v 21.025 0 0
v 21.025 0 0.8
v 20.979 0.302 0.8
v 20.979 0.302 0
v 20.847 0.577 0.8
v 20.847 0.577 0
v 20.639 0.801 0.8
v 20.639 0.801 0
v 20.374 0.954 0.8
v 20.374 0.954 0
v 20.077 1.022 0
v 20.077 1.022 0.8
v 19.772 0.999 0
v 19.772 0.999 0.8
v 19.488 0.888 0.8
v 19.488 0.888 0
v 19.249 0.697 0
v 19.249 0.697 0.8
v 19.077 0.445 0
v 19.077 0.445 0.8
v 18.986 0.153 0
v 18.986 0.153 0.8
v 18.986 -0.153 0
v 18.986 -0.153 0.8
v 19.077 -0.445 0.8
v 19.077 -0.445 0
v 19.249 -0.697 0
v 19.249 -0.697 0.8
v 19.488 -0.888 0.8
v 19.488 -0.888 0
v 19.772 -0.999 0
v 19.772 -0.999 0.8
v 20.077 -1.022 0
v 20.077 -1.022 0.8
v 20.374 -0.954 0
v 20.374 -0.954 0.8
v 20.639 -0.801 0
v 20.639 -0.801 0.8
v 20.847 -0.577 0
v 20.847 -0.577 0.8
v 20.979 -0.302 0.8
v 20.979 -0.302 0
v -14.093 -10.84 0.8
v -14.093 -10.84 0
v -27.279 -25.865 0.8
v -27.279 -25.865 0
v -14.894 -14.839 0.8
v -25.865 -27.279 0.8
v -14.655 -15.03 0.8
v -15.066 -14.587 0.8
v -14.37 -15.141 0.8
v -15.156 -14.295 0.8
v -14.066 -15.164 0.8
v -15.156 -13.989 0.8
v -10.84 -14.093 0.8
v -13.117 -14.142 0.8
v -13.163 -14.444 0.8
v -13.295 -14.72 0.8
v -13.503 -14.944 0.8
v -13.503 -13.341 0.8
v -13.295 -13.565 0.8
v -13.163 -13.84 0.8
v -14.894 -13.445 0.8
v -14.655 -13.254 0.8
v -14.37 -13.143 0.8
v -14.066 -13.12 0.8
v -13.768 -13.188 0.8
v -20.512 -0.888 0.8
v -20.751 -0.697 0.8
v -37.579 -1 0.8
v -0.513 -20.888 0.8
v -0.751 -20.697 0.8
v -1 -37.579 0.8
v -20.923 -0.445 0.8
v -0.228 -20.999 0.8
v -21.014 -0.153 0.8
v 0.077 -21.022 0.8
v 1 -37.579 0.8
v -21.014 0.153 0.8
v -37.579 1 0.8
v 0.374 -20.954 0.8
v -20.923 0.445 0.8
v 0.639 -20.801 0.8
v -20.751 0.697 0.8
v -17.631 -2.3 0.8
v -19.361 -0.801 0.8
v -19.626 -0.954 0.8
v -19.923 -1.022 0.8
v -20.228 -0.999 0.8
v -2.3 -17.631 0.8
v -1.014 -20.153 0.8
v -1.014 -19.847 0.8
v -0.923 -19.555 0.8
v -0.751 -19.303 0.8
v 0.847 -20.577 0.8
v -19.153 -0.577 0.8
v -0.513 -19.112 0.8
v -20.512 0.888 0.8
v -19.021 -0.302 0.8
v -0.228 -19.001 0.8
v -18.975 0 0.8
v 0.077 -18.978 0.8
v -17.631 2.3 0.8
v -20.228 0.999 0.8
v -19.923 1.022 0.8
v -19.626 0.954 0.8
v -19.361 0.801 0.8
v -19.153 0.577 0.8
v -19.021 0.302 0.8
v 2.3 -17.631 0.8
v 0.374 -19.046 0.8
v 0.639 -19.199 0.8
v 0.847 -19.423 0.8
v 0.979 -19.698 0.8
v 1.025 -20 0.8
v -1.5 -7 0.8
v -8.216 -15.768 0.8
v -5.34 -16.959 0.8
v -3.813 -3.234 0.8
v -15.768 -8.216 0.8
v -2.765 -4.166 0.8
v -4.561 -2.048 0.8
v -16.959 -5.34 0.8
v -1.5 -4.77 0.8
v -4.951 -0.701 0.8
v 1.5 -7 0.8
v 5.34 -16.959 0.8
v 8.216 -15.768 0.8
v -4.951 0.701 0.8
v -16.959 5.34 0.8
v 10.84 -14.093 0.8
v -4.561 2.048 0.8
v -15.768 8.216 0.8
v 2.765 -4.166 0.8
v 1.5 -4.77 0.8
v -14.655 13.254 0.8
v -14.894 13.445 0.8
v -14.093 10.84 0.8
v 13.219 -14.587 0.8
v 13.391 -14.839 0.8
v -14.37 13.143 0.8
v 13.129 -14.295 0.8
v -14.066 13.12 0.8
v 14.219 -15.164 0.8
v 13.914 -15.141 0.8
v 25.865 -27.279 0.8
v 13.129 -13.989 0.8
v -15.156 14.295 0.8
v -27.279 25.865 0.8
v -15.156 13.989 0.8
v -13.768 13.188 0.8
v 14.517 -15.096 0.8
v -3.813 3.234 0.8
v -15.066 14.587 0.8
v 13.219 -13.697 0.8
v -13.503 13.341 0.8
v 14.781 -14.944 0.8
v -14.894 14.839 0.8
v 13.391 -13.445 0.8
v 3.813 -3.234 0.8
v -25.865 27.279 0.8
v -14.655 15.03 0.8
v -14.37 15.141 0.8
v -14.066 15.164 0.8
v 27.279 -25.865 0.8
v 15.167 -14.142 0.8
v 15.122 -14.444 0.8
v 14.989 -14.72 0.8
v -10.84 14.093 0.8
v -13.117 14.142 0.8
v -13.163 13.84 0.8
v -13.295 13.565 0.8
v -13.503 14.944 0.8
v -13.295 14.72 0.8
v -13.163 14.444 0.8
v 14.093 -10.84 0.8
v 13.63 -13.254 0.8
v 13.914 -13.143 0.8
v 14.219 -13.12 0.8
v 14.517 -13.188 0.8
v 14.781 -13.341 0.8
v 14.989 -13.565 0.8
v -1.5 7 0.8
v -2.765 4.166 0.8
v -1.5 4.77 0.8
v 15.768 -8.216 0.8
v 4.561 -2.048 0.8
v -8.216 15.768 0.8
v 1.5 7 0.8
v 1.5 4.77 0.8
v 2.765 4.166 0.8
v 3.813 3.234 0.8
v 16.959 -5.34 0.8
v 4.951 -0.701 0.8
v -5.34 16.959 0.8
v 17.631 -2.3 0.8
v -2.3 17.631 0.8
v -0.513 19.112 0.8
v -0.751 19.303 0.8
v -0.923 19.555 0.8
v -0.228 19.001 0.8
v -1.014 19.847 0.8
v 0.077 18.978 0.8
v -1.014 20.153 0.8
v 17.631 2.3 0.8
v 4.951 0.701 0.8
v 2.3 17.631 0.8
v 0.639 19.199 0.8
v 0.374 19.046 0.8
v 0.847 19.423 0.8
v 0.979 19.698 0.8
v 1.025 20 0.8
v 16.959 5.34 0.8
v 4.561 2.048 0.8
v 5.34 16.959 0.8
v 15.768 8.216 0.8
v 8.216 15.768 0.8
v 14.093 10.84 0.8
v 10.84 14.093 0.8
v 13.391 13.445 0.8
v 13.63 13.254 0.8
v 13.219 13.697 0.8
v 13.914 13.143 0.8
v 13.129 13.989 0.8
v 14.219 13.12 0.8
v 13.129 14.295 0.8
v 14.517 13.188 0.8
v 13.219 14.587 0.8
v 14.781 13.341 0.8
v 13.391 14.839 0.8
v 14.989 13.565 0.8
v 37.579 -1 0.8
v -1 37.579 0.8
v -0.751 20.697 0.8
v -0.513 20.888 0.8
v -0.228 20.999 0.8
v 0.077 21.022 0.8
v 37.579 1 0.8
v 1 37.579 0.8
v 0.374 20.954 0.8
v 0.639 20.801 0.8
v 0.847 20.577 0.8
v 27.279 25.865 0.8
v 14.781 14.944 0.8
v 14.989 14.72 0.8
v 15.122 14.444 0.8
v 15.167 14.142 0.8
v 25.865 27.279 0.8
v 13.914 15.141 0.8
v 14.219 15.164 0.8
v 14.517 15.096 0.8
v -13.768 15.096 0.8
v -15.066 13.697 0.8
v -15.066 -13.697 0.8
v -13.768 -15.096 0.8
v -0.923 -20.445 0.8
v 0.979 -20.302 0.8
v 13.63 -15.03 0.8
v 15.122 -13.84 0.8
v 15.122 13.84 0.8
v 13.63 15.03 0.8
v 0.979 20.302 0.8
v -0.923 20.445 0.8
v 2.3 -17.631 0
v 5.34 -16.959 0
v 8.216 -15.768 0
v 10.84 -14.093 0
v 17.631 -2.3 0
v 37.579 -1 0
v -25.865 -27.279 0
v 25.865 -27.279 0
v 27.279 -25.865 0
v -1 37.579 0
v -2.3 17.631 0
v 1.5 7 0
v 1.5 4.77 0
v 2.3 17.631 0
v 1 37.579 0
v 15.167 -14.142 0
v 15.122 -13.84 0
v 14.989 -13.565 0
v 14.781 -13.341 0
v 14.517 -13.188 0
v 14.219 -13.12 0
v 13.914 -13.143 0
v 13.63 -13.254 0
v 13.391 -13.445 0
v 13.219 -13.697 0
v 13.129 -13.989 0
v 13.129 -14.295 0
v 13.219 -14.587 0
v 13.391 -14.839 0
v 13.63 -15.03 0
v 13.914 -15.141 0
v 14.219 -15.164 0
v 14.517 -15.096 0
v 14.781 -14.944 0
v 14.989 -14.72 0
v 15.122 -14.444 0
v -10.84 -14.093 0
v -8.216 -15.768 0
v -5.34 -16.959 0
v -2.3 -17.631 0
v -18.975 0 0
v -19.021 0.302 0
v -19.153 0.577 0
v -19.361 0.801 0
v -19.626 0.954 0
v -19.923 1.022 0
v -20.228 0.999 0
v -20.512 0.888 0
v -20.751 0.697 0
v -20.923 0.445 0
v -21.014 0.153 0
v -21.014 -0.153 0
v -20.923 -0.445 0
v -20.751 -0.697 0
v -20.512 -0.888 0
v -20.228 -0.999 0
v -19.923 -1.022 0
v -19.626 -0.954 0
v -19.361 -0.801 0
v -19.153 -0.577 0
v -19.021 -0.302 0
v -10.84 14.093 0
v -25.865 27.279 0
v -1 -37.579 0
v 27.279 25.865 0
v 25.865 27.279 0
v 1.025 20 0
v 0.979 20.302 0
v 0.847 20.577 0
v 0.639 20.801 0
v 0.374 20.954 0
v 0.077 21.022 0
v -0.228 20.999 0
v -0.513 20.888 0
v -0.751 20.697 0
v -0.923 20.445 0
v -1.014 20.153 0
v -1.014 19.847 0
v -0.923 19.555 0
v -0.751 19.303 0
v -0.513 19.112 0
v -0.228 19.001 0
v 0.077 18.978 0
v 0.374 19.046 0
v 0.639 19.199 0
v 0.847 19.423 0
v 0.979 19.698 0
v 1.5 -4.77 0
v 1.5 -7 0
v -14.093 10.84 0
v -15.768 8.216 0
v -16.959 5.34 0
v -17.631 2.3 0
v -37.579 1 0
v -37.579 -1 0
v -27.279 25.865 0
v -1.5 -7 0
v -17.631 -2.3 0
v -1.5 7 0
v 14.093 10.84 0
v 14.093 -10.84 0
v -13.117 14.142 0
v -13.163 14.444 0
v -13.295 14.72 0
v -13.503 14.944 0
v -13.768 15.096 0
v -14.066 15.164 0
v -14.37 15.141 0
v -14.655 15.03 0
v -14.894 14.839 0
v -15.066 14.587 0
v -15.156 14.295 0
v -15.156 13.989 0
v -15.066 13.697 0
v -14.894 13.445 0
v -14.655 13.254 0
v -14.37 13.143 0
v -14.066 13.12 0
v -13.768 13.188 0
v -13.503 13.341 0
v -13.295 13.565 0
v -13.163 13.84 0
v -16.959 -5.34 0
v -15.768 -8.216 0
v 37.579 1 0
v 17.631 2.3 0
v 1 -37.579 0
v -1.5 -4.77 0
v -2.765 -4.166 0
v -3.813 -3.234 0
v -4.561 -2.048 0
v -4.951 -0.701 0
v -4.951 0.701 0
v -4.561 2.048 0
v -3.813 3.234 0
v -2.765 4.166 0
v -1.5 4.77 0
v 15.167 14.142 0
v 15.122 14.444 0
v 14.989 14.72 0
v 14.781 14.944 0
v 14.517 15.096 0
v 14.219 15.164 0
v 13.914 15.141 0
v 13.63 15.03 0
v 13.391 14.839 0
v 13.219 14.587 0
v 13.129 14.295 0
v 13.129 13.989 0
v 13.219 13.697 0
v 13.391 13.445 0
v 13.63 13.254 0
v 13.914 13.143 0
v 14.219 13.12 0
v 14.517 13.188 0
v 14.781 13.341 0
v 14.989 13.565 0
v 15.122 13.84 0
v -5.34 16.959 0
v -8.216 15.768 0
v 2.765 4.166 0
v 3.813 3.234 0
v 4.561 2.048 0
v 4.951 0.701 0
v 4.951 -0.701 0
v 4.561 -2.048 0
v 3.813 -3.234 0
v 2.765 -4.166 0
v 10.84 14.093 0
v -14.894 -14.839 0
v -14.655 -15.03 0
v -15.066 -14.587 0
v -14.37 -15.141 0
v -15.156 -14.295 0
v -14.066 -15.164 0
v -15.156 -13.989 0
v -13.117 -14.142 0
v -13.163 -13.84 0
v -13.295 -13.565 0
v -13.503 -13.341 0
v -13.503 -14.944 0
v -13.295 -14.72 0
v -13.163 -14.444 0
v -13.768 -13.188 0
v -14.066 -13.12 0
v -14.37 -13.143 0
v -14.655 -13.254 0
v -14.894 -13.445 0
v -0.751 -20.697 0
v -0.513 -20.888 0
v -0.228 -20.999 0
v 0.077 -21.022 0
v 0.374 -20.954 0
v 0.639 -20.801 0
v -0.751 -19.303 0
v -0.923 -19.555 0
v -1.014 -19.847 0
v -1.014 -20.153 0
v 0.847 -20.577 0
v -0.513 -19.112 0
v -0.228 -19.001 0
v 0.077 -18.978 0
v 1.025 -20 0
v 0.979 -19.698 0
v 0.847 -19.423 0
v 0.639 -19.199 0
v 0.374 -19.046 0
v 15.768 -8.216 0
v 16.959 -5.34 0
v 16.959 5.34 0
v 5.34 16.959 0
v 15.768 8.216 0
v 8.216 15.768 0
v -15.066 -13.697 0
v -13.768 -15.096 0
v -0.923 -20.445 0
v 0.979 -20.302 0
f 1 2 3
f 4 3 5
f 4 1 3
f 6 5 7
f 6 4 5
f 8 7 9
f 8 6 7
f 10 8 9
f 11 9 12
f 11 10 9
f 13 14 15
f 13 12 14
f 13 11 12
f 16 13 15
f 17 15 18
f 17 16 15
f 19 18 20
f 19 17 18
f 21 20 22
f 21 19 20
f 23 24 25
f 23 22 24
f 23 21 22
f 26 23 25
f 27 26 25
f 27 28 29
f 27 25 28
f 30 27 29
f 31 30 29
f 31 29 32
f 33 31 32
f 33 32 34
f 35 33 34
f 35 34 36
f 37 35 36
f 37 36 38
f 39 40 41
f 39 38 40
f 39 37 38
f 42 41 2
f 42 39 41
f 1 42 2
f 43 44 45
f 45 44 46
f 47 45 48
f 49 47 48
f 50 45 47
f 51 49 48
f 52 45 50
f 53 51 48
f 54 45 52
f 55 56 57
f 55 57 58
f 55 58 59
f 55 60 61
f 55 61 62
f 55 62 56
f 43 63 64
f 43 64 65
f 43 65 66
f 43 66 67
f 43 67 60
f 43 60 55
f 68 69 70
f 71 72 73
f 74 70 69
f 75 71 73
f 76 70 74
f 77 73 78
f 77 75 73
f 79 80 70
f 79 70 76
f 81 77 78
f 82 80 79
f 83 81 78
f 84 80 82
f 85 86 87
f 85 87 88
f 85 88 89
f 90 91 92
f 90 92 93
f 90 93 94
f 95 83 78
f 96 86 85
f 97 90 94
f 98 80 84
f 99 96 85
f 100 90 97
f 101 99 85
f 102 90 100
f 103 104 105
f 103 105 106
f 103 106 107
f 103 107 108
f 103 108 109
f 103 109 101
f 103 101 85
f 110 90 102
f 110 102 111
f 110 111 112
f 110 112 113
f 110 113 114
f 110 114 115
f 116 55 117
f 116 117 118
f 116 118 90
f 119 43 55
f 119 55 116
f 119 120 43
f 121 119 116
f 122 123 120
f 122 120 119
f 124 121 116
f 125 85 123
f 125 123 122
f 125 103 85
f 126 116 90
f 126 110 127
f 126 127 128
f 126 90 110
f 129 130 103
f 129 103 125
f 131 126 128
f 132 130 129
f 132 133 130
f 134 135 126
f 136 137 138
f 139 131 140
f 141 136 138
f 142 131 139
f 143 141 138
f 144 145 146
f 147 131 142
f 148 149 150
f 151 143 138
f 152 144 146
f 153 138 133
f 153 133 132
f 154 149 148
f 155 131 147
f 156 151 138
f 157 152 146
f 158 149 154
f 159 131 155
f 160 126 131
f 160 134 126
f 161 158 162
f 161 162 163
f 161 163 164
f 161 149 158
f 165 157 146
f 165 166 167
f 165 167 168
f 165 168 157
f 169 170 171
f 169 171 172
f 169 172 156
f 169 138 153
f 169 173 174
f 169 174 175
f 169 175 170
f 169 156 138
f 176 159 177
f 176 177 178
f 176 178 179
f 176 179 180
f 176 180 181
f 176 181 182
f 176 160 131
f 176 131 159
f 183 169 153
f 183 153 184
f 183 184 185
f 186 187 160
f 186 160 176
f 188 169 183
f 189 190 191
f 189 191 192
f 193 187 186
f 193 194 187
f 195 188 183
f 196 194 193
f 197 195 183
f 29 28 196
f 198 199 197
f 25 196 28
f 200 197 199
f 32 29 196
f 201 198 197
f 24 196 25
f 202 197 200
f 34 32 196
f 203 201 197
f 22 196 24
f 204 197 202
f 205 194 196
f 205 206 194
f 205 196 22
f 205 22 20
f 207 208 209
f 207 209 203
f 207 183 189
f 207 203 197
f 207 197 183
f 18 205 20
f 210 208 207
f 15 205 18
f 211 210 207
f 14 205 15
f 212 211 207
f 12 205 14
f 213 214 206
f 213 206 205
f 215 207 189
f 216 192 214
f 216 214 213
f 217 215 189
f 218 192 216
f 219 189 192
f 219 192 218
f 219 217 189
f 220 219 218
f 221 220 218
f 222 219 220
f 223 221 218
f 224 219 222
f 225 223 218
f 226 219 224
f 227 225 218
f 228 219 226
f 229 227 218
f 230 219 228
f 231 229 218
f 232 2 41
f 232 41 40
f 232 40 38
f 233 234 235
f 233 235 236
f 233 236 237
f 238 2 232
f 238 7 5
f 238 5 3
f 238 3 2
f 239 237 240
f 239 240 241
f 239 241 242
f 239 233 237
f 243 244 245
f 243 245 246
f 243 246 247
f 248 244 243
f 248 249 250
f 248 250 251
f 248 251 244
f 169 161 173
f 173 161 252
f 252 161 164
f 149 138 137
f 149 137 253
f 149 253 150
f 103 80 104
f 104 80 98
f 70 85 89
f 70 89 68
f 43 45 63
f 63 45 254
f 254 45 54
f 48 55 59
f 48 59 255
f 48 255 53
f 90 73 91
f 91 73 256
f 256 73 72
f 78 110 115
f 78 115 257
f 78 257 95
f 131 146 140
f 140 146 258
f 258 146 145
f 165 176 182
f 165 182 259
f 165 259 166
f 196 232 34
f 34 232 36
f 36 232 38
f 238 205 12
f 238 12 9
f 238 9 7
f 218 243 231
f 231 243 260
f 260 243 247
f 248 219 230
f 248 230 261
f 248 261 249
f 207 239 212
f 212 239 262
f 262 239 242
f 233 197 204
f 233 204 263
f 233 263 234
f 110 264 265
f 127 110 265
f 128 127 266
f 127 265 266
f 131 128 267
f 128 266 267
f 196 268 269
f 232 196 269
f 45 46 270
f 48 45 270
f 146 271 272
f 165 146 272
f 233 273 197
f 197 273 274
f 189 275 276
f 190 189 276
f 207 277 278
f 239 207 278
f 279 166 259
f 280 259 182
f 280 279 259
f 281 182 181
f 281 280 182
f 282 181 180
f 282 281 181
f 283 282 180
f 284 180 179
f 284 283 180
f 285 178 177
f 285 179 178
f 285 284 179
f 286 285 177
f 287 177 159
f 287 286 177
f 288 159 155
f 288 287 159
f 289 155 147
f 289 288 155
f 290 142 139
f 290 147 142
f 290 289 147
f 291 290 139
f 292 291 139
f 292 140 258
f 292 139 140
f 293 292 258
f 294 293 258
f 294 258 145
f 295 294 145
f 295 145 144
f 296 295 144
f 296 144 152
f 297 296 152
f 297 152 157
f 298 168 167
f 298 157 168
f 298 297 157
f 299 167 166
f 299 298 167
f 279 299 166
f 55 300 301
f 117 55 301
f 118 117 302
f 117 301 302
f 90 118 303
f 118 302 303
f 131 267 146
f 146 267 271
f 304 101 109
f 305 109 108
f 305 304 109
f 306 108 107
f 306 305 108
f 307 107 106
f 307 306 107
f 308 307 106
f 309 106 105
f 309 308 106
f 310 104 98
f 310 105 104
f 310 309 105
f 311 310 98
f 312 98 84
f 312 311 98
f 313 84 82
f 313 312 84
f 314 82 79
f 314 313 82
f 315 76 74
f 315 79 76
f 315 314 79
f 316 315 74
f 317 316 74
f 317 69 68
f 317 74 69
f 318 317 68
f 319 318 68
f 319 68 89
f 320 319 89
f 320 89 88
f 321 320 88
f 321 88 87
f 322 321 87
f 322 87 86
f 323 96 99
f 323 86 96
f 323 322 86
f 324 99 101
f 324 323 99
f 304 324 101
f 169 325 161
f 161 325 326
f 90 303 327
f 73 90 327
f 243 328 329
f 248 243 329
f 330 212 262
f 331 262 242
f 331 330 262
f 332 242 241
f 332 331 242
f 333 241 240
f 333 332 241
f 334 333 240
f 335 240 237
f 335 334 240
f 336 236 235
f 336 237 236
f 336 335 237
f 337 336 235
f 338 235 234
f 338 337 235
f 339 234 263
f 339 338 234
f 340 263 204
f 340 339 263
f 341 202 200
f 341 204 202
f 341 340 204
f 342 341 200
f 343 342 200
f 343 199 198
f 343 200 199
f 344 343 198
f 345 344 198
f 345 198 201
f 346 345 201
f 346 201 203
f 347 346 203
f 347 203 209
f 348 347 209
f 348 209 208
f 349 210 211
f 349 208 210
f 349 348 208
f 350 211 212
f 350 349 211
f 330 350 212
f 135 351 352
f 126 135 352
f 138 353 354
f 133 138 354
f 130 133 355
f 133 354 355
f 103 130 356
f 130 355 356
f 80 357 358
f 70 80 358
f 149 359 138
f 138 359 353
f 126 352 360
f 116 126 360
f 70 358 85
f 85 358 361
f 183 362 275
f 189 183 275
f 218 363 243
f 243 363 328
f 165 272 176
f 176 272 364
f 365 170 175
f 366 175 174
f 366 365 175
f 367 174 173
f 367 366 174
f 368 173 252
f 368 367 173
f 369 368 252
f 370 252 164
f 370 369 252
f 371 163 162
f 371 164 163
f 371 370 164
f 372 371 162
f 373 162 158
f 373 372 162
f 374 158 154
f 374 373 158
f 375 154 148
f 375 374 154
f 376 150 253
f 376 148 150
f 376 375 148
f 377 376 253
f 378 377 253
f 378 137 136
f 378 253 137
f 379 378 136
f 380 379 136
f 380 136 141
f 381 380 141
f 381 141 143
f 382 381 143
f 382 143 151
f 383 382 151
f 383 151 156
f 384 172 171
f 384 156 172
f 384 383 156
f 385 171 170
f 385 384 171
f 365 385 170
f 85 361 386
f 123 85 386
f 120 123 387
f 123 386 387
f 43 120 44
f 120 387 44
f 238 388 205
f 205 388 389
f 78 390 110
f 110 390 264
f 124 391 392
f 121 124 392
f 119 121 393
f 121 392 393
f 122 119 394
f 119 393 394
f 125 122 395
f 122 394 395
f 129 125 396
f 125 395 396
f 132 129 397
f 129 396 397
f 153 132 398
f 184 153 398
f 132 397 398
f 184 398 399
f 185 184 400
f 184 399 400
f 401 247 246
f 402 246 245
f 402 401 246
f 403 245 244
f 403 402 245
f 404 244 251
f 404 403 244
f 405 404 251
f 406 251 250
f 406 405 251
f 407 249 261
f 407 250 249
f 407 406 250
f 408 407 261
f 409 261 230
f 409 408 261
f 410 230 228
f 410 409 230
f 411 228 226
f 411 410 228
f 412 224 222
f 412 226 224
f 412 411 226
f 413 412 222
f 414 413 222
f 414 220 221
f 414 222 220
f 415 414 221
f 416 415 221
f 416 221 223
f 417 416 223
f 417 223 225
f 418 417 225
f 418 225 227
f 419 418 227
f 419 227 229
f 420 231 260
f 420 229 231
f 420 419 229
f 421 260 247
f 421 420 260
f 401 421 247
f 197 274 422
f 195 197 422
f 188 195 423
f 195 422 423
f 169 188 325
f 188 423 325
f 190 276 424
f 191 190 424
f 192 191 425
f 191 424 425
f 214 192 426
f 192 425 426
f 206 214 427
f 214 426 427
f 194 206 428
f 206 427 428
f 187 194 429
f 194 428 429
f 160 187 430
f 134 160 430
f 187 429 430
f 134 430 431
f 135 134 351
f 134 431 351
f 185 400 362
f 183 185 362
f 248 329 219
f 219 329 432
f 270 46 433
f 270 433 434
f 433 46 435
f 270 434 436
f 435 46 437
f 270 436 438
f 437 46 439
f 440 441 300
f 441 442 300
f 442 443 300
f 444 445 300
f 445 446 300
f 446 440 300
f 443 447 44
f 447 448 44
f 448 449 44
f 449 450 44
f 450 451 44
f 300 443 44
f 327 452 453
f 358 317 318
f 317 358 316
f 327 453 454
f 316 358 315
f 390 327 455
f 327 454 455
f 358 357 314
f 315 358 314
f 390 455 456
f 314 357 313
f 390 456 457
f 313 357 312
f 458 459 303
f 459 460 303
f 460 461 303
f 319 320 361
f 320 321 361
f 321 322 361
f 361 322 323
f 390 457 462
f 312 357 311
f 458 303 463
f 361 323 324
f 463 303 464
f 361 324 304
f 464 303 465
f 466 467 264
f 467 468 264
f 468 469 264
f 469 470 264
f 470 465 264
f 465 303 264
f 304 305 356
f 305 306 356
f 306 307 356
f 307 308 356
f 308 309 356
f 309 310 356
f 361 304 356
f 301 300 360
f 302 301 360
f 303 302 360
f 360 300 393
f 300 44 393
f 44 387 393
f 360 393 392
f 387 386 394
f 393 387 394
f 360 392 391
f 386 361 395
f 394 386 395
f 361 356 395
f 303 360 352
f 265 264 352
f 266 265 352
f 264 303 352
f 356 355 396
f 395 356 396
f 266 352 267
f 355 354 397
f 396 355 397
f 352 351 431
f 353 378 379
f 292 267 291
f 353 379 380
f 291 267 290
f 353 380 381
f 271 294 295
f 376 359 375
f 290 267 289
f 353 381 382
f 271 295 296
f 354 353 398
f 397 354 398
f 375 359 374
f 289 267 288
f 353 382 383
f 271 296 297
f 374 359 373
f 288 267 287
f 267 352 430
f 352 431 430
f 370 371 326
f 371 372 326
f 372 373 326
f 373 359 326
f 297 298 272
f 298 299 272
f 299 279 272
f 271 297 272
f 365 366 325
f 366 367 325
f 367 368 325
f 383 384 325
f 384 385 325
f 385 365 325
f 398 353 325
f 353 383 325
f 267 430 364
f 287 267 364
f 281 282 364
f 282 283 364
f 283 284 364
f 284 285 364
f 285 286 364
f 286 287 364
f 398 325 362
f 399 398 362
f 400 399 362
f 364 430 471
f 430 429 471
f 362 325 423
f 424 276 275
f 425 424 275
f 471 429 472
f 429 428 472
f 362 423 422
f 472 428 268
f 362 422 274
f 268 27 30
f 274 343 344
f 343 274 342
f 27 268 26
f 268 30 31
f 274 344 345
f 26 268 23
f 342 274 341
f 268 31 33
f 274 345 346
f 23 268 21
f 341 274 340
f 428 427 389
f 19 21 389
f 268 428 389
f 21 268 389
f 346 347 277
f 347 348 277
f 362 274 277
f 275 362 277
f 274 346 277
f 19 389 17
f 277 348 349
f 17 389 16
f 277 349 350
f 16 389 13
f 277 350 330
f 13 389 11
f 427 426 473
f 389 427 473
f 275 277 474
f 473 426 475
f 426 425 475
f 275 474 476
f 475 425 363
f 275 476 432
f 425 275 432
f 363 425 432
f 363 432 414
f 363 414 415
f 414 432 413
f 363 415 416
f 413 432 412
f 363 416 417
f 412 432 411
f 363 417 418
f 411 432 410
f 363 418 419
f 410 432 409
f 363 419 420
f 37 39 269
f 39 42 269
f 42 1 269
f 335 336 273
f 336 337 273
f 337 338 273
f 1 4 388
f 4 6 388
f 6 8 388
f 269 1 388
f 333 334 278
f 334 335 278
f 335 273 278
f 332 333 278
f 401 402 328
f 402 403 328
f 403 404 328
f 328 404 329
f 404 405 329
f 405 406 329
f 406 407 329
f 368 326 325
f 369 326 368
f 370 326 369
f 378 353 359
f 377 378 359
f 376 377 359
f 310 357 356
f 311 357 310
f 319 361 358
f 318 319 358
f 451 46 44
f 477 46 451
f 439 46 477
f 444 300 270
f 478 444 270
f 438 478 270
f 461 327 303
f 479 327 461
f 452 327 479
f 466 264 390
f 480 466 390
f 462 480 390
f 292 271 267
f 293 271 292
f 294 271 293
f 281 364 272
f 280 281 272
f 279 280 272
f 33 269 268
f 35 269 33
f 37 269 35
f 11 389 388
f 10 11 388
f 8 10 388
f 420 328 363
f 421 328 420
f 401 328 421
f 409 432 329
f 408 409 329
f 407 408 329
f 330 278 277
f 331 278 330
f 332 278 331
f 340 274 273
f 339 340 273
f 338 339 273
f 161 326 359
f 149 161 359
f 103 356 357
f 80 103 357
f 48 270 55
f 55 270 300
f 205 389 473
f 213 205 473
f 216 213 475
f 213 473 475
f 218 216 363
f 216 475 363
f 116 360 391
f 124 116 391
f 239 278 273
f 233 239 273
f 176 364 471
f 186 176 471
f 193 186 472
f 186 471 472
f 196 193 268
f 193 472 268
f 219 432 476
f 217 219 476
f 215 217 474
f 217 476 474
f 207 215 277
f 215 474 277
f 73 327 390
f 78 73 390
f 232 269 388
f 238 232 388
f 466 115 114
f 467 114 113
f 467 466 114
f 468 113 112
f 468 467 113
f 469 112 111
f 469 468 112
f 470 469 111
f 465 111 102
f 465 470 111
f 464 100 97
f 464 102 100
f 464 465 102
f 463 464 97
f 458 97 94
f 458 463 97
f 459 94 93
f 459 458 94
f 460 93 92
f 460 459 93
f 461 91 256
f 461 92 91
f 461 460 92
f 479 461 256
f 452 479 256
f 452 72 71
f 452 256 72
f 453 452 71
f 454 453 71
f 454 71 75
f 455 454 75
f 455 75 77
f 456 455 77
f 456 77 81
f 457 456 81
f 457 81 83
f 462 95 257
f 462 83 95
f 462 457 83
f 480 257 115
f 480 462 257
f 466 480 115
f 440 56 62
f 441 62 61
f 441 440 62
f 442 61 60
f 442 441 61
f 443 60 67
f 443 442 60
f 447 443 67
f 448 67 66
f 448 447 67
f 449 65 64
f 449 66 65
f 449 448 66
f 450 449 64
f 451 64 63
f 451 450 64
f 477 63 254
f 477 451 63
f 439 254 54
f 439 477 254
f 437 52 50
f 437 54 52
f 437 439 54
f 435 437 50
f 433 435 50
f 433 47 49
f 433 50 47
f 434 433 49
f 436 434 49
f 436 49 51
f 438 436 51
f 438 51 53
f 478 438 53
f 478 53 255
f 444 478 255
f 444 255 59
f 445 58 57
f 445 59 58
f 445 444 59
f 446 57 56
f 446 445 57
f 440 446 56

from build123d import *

# Parameters (mm, degrees)
BOSS_EXTRUDE1_DEPTH = 0.8
SKETCH2_R           = 1.025
CUT_EXTRUDE2_DEPTH  = 10


# Read off the part's stored shape, not the designer's step: Boss-Extrude1
with BuildPart() as part:
    # Boss-Extrude1 outline → Boss-Extrude1 (new body)
    with BuildSketch(Plane.XY):
        with BuildLine():
            ThreePointArc((-2.3, 17.630609746), (-6.804111427, 16.426578088), (-10.840378111, 14.093069304))
            Line((-10.840378111, 14.093069304), (-25.865044656, 27.279258218))
            Line((-25.865044656, 27.279258218), (-27.279258218, 25.865044656))
            Line((-27.279258218, 25.865044656), (-14.093069304, 10.840378111))
            ThreePointArc((-14.093069304, 10.840378111), (-16.426578088, 6.804111427), (-17.630609746, 2.3))
            Line((-17.630609746, 2.3), (-37.578696944, 1))
            Line((-37.578696944, 1), (-37.578696944, -1))
            Line((-37.578696944, -1), (-17.630609746, -2.3))
            ThreePointArc((-17.630609746, -2.3), (-16.426578088, -6.804111427), (-14.093069304, -10.840378111))
            Line((-14.093069304, -10.840378111), (-27.279258218, -25.865044656))
            Line((-27.279258218, -25.865044656), (-25.865044656, -27.279258218))
            Line((-25.865044656, -27.279258218), (-10.840378111, -14.093069304))
            ThreePointArc((-10.840378111, -14.093069304), (-6.804111427, -16.426578088), (-2.3, -17.630609746))
            Line((-2.3, -17.630609746), (-1, -37.578696944))
            Line((-1, -37.578696944), (1, -37.578696944))
            Line((1, -37.578696944), (2.3, -17.630609746))
            ThreePointArc((2.3, -17.630609746), (6.804111427, -16.426578088), (10.840378111, -14.093069304))
            Line((10.840378111, -14.093069304), (25.865044656, -27.279258218))
            Line((25.865044656, -27.279258218), (27.279258218, -25.865044656))
            Line((27.279258218, -25.865044656), (14.093069304, -10.840378111))
            ThreePointArc((14.093069304, -10.840378111), (16.426578088, -6.804111427), (17.630609746, -2.3))
            Line((17.630609746, -2.3), (37.578696944, -1))
            Line((37.578696944, -1), (37.578696944, 1))
            Line((37.578696944, 1), (17.630609746, 2.3))
            ThreePointArc((17.630609746, 2.3), (16.426578088, 6.804111427), (14.093069304, 10.840378111))
            Line((14.093069304, 10.840378111), (27.279258218, 25.865044656))
            Line((27.279258218, 25.865044656), (25.865044656, 27.279258218))
            Line((25.865044656, 27.279258218), (10.840378111, 14.093069304))
            ThreePointArc((10.840378111, 14.093069304), (6.804111427, 16.426578088), (2.3, 17.630609746))
            Line((2.3, 17.630609746), (1, 37.578696944))
            Line((1, 37.578696944), (-1, 37.578696944))
            Line((-1, 37.578696944), (-2.3, 17.630609746))
        make_face()
        with BuildLine():
            Line((-1.5, -7), (-1.5, -4.769696007))
            ThreePointArc((-1.5, -4.769696007), (-5, 0), (-1.5, 4.769696007))
            Line((-1.5, 4.769696007), (-1.5, 7))
            Line((-1.5, 7), (1.5, 7))
            Line((1.5, 7), (1.5, 4.769696007))
            ThreePointArc((1.5, 4.769696007), (5, 0), (1.5, -4.769696007))
            Line((1.5, -4.769696007), (1.5, -7))
            Line((1.5, -7), (-1.5, -7))
        make_face(mode=Mode.SUBTRACT)
    extrude(amount=BOSS_EXTRUDE1_DEPTH)

    # Sketch2 → Cut-Extrude2 (cut)
    with BuildSketch(Plane.XY):
        with Locations((0, 20)):
            Circle(SKETCH2_R)
        with Locations((14.142135624, 14.142135624)):
            Circle(SKETCH2_R)
        with Locations((20, 0)):
            Circle(SKETCH2_R)
        with Locations((14.142135624, -14.142135624)):
            Circle(SKETCH2_R)
        with Locations((0, -20)):
            Circle(SKETCH2_R)
        with Locations((-14.142135624, -14.142135624)):
            Circle(SKETCH2_R)
        with Locations((-20, 0)):
            Circle(SKETCH2_R)
        with Locations((-14.142135624, 14.142135624)):
            Circle(SKETCH2_R)
    extrude(amount=CUT_EXTRUDE2_DEPTH, mode=Mode.SUBTRACT)


solid = part.part
